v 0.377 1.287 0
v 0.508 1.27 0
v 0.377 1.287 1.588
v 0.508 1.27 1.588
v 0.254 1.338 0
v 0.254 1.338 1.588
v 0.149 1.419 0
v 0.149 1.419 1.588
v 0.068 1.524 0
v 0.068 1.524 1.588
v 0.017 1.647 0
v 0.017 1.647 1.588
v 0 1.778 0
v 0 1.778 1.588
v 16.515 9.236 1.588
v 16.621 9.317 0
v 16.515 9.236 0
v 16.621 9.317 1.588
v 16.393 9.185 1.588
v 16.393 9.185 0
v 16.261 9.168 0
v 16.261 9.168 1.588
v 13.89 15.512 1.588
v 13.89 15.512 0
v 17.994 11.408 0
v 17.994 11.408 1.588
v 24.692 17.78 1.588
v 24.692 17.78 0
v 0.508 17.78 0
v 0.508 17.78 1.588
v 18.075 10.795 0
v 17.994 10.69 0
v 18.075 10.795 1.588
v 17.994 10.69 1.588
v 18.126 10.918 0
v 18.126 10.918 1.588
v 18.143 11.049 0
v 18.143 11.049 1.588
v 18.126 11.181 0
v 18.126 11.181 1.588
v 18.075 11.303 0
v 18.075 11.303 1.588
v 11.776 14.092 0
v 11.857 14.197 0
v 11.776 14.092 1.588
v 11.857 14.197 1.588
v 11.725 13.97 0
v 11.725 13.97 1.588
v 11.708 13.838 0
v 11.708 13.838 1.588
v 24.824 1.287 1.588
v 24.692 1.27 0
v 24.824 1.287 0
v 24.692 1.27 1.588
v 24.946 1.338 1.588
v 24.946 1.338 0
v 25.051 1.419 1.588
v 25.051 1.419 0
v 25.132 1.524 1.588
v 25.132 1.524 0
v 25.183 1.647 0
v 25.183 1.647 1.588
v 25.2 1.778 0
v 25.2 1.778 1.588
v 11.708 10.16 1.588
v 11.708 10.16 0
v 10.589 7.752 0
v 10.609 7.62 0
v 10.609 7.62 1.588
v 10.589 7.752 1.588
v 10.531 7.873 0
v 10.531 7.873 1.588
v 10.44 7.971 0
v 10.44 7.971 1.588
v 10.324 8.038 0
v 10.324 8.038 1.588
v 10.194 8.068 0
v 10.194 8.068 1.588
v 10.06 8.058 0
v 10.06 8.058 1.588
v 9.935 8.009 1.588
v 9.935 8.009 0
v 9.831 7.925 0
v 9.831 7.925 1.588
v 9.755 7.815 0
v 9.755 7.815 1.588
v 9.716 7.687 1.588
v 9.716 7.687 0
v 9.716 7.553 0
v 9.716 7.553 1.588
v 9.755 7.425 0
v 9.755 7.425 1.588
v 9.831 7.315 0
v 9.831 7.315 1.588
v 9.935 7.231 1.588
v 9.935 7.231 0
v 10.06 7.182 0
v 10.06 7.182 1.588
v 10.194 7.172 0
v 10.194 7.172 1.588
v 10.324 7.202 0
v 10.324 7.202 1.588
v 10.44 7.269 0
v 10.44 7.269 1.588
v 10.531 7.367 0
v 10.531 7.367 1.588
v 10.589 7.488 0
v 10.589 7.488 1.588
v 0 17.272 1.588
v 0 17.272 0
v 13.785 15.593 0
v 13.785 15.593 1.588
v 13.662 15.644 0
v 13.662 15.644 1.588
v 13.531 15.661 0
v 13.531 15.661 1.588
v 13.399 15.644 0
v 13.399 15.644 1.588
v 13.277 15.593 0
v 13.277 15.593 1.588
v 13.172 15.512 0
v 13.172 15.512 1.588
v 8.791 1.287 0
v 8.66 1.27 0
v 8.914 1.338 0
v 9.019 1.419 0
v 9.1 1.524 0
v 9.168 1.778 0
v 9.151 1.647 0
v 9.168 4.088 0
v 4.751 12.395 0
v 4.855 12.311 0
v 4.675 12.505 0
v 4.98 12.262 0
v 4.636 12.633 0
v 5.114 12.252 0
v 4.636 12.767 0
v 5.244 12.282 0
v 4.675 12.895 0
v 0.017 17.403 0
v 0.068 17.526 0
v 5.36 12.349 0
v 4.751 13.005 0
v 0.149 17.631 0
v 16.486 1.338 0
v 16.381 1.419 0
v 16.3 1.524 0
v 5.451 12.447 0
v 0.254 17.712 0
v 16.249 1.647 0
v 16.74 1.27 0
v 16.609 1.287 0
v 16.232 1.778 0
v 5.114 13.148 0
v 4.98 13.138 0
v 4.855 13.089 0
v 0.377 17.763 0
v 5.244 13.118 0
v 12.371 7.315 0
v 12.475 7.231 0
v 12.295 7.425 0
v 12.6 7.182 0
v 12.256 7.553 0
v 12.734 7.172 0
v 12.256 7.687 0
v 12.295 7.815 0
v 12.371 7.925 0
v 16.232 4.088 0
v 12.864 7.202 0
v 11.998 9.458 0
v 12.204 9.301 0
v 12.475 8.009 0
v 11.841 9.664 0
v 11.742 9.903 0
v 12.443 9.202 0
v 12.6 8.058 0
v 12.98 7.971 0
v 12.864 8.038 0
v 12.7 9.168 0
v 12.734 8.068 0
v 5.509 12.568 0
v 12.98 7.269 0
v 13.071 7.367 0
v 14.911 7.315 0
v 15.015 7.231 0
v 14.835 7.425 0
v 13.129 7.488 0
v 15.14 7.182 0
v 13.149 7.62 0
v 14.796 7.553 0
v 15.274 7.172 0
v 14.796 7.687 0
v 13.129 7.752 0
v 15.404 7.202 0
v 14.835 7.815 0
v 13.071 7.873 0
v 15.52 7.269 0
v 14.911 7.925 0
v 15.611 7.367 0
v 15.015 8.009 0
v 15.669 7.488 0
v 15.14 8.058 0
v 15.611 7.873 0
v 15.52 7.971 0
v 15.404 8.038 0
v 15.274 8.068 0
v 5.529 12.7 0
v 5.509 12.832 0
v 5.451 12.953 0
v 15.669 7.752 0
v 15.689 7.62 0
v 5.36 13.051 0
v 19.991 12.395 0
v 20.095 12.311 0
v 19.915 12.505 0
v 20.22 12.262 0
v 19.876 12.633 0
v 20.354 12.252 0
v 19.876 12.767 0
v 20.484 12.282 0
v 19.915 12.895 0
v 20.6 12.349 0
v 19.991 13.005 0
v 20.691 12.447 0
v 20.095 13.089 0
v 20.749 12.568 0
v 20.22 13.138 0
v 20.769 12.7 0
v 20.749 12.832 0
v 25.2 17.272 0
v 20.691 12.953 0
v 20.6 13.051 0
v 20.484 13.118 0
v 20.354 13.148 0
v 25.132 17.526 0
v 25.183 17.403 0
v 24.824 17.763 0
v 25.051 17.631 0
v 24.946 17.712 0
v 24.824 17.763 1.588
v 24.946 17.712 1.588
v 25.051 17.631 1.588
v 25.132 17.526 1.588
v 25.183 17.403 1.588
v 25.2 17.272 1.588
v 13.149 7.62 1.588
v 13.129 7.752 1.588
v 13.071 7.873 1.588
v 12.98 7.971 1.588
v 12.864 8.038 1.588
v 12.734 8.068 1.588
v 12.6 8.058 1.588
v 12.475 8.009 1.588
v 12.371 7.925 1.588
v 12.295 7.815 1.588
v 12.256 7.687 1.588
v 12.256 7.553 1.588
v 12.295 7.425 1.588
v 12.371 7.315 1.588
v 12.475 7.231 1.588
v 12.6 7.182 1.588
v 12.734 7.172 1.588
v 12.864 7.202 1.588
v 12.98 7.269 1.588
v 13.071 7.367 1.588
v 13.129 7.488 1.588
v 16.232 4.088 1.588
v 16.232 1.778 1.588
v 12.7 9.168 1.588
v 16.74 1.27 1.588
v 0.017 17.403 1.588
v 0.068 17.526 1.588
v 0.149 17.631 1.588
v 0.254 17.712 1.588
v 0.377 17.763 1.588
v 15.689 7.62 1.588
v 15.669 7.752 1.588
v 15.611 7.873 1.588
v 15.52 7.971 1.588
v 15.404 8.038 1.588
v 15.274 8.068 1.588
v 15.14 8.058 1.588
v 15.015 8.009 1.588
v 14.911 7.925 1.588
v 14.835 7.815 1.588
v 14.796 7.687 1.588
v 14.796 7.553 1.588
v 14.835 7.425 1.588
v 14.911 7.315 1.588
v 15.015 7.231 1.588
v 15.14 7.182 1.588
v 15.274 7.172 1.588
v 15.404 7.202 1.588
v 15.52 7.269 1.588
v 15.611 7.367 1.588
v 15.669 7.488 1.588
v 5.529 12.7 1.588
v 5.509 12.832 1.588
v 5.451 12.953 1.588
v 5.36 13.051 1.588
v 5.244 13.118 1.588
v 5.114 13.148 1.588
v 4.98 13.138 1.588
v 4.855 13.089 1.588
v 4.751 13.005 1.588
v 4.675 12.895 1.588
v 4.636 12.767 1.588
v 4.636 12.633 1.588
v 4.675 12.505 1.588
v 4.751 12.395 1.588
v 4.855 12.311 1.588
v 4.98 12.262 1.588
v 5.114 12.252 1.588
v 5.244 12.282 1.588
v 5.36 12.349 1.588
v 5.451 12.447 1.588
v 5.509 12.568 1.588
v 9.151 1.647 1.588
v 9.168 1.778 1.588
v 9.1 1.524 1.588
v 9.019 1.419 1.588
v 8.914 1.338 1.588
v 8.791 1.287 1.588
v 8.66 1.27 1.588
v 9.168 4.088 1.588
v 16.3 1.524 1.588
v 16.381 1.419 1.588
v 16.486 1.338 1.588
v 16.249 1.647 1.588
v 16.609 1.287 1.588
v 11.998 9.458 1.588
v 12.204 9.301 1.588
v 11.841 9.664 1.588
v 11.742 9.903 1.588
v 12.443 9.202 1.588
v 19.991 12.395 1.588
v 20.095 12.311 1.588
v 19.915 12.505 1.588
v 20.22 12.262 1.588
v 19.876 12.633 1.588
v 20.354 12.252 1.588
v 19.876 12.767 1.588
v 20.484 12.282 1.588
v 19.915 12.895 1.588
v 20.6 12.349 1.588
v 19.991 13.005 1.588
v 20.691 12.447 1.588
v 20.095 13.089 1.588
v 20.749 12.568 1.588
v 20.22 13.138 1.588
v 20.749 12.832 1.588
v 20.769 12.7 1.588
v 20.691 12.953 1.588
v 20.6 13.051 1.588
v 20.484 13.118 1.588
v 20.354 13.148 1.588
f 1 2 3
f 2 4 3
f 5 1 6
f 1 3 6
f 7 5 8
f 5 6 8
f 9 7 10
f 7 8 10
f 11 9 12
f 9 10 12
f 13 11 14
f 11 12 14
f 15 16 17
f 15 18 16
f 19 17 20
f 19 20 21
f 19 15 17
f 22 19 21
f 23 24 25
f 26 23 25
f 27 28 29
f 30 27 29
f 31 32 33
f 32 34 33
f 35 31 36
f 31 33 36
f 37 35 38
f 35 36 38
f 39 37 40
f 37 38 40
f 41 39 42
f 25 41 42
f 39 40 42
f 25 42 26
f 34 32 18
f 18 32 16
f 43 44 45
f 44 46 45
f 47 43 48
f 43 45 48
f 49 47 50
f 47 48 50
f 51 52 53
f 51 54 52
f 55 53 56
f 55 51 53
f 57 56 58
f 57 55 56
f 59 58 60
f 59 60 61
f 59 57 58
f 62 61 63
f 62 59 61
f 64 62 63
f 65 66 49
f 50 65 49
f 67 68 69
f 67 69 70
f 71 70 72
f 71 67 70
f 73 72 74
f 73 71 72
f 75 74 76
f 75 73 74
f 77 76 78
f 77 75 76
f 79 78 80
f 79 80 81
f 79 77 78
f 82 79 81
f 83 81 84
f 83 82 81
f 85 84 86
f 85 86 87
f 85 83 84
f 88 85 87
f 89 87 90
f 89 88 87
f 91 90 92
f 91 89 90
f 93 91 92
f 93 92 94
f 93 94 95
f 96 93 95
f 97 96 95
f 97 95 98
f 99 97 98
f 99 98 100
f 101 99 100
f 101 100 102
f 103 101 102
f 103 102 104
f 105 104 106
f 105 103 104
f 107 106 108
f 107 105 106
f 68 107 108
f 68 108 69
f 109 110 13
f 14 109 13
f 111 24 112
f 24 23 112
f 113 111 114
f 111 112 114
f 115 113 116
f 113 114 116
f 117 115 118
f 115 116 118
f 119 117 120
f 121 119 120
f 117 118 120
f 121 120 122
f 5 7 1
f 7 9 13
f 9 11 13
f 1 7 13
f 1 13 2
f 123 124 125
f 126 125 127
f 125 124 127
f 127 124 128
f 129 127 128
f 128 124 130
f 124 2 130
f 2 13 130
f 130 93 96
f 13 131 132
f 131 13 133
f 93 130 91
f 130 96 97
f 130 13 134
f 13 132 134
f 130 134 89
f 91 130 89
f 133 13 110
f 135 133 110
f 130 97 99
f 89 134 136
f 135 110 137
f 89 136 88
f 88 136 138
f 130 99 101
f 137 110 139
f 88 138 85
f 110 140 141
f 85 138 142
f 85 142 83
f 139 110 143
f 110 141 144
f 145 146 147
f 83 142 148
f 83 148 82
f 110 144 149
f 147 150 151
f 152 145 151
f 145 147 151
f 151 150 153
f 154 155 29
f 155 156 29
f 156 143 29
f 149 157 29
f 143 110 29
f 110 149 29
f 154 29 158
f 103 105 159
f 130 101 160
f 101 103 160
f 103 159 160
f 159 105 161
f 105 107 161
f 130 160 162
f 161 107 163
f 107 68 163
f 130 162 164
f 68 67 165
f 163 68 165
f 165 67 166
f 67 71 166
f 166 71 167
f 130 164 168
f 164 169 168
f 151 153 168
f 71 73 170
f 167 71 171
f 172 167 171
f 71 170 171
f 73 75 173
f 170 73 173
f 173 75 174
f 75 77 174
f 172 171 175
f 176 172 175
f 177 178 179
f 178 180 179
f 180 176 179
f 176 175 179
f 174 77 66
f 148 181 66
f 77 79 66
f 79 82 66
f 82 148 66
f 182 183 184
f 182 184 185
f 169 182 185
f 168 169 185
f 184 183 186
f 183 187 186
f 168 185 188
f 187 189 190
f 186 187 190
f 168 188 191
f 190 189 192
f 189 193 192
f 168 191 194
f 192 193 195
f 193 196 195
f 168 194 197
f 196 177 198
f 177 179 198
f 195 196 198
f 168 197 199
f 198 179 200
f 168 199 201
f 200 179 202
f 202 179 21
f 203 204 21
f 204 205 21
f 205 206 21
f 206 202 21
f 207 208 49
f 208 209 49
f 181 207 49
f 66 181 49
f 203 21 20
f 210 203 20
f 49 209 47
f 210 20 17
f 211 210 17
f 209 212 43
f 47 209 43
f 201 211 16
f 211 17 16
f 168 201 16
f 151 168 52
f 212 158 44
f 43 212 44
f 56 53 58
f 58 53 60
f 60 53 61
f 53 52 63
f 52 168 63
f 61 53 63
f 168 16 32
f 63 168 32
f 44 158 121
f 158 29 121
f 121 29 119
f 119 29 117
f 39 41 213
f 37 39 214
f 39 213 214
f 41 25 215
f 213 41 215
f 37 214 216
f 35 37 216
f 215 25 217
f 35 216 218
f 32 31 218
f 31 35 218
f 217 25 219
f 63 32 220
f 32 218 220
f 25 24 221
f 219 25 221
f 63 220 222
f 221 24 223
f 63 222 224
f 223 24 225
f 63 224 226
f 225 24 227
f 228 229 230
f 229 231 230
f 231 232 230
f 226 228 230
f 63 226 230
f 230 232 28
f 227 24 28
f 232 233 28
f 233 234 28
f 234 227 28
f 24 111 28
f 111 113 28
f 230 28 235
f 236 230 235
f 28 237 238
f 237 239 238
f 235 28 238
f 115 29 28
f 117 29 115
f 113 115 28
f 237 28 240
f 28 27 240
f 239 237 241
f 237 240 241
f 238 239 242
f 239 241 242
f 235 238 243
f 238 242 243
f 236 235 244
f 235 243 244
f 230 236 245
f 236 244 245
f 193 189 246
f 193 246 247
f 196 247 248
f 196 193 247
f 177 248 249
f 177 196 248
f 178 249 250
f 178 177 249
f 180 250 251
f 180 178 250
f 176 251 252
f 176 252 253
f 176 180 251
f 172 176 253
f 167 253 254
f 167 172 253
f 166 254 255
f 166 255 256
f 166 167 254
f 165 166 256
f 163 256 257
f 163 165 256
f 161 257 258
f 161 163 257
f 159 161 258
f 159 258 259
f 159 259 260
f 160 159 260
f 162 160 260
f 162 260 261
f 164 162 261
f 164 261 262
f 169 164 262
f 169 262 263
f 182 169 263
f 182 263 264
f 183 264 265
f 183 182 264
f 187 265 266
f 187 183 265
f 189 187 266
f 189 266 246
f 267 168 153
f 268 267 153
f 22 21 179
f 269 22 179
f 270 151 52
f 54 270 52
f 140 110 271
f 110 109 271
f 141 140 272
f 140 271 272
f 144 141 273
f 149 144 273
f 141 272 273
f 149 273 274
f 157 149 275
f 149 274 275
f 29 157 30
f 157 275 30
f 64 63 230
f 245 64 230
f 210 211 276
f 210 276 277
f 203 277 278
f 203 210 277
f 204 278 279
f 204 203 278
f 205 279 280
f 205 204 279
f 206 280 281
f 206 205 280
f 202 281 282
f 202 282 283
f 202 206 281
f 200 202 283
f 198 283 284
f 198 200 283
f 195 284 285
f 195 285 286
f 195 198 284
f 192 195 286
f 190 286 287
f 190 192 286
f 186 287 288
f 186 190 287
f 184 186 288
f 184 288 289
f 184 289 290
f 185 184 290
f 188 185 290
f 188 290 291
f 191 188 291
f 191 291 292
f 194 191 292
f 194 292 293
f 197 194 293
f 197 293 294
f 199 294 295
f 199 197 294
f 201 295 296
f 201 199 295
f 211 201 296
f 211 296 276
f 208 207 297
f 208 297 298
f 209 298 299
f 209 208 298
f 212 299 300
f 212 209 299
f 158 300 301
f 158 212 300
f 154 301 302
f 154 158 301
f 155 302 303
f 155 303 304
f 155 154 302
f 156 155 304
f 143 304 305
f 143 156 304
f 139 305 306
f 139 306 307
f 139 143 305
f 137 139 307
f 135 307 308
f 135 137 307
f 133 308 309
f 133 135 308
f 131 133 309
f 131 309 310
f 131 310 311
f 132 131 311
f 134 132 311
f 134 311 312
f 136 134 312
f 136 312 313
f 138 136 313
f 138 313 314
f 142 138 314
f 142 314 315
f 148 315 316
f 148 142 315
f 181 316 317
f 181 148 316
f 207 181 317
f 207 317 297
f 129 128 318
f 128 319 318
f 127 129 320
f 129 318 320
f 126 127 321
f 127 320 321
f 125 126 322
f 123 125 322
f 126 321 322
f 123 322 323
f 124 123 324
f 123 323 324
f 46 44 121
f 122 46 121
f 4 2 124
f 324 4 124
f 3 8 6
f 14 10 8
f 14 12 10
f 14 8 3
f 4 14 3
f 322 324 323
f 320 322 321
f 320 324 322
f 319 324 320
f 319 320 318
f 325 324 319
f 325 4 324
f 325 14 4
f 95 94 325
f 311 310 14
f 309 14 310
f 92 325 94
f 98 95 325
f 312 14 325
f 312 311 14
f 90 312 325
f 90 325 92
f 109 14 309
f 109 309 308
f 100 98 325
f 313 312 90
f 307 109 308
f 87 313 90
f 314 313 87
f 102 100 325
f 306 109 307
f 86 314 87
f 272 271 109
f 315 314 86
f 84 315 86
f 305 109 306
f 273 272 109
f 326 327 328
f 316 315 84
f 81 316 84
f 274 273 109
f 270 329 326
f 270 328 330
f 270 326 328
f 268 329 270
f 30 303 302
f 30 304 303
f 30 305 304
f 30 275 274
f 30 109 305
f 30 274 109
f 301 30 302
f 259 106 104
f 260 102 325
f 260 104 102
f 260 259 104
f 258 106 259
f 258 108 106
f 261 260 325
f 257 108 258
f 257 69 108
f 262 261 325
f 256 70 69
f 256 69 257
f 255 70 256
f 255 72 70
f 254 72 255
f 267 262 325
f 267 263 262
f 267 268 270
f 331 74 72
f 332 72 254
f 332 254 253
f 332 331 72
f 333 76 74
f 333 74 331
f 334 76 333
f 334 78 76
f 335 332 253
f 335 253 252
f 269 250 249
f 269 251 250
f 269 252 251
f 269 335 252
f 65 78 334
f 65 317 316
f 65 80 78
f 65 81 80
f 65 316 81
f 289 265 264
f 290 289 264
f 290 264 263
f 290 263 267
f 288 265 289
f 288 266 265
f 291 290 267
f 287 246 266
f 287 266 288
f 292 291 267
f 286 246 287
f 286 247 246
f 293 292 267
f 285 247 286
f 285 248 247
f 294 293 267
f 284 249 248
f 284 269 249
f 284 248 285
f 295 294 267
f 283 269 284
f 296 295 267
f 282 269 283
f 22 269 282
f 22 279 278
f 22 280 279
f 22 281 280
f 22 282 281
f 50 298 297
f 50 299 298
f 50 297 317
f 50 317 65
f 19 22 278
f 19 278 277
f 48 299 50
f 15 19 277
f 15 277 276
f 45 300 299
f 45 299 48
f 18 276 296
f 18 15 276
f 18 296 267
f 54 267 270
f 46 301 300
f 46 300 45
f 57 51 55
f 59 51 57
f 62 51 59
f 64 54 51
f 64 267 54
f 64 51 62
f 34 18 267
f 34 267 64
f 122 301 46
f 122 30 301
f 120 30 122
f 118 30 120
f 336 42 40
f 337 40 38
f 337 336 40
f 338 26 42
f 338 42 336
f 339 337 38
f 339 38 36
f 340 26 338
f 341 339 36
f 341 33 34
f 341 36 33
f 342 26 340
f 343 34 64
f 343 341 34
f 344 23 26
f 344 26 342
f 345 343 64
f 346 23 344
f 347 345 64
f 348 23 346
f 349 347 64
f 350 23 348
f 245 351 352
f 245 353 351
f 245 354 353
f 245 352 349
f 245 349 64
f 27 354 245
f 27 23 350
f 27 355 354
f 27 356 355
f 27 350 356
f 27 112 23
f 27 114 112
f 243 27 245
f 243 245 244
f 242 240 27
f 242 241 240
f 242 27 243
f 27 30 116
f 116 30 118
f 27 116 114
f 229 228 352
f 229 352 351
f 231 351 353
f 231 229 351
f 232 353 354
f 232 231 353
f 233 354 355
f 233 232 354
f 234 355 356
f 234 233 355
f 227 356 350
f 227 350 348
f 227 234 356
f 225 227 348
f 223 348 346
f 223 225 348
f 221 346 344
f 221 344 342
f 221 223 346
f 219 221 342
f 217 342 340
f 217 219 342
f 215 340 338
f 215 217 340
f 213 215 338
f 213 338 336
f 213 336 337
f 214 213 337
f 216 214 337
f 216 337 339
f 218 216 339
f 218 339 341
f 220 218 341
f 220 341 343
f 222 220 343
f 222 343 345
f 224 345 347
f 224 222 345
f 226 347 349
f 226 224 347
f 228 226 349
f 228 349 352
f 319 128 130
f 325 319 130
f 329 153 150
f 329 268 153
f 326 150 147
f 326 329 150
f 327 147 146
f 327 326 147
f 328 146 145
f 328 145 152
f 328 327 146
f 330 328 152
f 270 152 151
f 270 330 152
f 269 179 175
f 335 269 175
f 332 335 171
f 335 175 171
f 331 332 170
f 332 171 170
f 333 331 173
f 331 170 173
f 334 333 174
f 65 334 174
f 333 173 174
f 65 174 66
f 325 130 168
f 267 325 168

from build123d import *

# Parameters (mm, degrees)
F2_R     = 0.4490128061
F3_DEPTH = 1.5875
F4_R     = 0.508


# Not quite as in the source:
# - a length typed as a fraction of an inch, garbled in the dataset ("3 / 203.2 mm" for 3/8 in), is restored


with BuildPart() as f3:
    # F2 (on Top) → F3 (new body)
    with BuildSketch(Plane.XY):
        Polygon((9.1678125, 1.27), (9.1678125, 4.0878125), (16.2321875, 4.0878125), (16.2321875, 1.27), (25.2002304245, 1.27), (25.2002304245, 17.78), (0, 17.78), (0, 1.27), align=None)
        with Locations((10.16, 7.62)):
            Circle(F2_R, mode=Mode.SUBTRACT)
        with Locations((12.7, 7.62)):
            Circle(F2_R, mode=Mode.SUBTRACT)
        with Locations((15.24, 7.62)):
            Circle(F2_R, mode=Mode.SUBTRACT)
        with Locations((5.08, 12.7)):
            Circle(F2_R, mode=Mode.SUBTRACT)
        with BuildLine():
            Line((16.4718229778, 9.1678125), (12.7, 9.1678125))
            ThreePointArc((12.7, 9.1678125), (11.9984174905, 9.4584174905), (11.7078125, 10.16))
            Line((11.7078125, 10.16), (11.7078125, 14.0486225217))
            Line((11.7078125, 14.0486225217), (13.5308885435, 15.8716985652))
            Line((13.5308885435, 15.8716985652), (18.3532987932, 11.0492883154))
            Line((18.3532987932, 11.0492883154), (16.4718229778, 9.1678125))
        make_face(mode=Mode.SUBTRACT)
        with Locations((20.32, 12.7)):
            Circle(F2_R, mode=Mode.SUBTRACT)
    extrude(amount=F3_DEPTH)

    # F4
    f4_edges = [f3.edges().sort_by_distance(p)[0] for p in [
        (25.20023, 1.27, 0.79375),
        (16.232188, 1.27, 0.79375),
        (9.167813, 1.27, 0.79375),
        (0, 1.27, 0.79375),
        (0, 17.78, 0.79375),
        (25.20023, 17.78, 0.79375),
        (11.707813, 14.048623, 0.79375),
        (13.530889, 15.871699, 0.79375),
        (18.353299, 11.049288, 0.79375),
        (16.471823, 9.167813, 0.79375),
    ]]
    fillet(f4_edges, radius=F4_R)


solid = f3.part
